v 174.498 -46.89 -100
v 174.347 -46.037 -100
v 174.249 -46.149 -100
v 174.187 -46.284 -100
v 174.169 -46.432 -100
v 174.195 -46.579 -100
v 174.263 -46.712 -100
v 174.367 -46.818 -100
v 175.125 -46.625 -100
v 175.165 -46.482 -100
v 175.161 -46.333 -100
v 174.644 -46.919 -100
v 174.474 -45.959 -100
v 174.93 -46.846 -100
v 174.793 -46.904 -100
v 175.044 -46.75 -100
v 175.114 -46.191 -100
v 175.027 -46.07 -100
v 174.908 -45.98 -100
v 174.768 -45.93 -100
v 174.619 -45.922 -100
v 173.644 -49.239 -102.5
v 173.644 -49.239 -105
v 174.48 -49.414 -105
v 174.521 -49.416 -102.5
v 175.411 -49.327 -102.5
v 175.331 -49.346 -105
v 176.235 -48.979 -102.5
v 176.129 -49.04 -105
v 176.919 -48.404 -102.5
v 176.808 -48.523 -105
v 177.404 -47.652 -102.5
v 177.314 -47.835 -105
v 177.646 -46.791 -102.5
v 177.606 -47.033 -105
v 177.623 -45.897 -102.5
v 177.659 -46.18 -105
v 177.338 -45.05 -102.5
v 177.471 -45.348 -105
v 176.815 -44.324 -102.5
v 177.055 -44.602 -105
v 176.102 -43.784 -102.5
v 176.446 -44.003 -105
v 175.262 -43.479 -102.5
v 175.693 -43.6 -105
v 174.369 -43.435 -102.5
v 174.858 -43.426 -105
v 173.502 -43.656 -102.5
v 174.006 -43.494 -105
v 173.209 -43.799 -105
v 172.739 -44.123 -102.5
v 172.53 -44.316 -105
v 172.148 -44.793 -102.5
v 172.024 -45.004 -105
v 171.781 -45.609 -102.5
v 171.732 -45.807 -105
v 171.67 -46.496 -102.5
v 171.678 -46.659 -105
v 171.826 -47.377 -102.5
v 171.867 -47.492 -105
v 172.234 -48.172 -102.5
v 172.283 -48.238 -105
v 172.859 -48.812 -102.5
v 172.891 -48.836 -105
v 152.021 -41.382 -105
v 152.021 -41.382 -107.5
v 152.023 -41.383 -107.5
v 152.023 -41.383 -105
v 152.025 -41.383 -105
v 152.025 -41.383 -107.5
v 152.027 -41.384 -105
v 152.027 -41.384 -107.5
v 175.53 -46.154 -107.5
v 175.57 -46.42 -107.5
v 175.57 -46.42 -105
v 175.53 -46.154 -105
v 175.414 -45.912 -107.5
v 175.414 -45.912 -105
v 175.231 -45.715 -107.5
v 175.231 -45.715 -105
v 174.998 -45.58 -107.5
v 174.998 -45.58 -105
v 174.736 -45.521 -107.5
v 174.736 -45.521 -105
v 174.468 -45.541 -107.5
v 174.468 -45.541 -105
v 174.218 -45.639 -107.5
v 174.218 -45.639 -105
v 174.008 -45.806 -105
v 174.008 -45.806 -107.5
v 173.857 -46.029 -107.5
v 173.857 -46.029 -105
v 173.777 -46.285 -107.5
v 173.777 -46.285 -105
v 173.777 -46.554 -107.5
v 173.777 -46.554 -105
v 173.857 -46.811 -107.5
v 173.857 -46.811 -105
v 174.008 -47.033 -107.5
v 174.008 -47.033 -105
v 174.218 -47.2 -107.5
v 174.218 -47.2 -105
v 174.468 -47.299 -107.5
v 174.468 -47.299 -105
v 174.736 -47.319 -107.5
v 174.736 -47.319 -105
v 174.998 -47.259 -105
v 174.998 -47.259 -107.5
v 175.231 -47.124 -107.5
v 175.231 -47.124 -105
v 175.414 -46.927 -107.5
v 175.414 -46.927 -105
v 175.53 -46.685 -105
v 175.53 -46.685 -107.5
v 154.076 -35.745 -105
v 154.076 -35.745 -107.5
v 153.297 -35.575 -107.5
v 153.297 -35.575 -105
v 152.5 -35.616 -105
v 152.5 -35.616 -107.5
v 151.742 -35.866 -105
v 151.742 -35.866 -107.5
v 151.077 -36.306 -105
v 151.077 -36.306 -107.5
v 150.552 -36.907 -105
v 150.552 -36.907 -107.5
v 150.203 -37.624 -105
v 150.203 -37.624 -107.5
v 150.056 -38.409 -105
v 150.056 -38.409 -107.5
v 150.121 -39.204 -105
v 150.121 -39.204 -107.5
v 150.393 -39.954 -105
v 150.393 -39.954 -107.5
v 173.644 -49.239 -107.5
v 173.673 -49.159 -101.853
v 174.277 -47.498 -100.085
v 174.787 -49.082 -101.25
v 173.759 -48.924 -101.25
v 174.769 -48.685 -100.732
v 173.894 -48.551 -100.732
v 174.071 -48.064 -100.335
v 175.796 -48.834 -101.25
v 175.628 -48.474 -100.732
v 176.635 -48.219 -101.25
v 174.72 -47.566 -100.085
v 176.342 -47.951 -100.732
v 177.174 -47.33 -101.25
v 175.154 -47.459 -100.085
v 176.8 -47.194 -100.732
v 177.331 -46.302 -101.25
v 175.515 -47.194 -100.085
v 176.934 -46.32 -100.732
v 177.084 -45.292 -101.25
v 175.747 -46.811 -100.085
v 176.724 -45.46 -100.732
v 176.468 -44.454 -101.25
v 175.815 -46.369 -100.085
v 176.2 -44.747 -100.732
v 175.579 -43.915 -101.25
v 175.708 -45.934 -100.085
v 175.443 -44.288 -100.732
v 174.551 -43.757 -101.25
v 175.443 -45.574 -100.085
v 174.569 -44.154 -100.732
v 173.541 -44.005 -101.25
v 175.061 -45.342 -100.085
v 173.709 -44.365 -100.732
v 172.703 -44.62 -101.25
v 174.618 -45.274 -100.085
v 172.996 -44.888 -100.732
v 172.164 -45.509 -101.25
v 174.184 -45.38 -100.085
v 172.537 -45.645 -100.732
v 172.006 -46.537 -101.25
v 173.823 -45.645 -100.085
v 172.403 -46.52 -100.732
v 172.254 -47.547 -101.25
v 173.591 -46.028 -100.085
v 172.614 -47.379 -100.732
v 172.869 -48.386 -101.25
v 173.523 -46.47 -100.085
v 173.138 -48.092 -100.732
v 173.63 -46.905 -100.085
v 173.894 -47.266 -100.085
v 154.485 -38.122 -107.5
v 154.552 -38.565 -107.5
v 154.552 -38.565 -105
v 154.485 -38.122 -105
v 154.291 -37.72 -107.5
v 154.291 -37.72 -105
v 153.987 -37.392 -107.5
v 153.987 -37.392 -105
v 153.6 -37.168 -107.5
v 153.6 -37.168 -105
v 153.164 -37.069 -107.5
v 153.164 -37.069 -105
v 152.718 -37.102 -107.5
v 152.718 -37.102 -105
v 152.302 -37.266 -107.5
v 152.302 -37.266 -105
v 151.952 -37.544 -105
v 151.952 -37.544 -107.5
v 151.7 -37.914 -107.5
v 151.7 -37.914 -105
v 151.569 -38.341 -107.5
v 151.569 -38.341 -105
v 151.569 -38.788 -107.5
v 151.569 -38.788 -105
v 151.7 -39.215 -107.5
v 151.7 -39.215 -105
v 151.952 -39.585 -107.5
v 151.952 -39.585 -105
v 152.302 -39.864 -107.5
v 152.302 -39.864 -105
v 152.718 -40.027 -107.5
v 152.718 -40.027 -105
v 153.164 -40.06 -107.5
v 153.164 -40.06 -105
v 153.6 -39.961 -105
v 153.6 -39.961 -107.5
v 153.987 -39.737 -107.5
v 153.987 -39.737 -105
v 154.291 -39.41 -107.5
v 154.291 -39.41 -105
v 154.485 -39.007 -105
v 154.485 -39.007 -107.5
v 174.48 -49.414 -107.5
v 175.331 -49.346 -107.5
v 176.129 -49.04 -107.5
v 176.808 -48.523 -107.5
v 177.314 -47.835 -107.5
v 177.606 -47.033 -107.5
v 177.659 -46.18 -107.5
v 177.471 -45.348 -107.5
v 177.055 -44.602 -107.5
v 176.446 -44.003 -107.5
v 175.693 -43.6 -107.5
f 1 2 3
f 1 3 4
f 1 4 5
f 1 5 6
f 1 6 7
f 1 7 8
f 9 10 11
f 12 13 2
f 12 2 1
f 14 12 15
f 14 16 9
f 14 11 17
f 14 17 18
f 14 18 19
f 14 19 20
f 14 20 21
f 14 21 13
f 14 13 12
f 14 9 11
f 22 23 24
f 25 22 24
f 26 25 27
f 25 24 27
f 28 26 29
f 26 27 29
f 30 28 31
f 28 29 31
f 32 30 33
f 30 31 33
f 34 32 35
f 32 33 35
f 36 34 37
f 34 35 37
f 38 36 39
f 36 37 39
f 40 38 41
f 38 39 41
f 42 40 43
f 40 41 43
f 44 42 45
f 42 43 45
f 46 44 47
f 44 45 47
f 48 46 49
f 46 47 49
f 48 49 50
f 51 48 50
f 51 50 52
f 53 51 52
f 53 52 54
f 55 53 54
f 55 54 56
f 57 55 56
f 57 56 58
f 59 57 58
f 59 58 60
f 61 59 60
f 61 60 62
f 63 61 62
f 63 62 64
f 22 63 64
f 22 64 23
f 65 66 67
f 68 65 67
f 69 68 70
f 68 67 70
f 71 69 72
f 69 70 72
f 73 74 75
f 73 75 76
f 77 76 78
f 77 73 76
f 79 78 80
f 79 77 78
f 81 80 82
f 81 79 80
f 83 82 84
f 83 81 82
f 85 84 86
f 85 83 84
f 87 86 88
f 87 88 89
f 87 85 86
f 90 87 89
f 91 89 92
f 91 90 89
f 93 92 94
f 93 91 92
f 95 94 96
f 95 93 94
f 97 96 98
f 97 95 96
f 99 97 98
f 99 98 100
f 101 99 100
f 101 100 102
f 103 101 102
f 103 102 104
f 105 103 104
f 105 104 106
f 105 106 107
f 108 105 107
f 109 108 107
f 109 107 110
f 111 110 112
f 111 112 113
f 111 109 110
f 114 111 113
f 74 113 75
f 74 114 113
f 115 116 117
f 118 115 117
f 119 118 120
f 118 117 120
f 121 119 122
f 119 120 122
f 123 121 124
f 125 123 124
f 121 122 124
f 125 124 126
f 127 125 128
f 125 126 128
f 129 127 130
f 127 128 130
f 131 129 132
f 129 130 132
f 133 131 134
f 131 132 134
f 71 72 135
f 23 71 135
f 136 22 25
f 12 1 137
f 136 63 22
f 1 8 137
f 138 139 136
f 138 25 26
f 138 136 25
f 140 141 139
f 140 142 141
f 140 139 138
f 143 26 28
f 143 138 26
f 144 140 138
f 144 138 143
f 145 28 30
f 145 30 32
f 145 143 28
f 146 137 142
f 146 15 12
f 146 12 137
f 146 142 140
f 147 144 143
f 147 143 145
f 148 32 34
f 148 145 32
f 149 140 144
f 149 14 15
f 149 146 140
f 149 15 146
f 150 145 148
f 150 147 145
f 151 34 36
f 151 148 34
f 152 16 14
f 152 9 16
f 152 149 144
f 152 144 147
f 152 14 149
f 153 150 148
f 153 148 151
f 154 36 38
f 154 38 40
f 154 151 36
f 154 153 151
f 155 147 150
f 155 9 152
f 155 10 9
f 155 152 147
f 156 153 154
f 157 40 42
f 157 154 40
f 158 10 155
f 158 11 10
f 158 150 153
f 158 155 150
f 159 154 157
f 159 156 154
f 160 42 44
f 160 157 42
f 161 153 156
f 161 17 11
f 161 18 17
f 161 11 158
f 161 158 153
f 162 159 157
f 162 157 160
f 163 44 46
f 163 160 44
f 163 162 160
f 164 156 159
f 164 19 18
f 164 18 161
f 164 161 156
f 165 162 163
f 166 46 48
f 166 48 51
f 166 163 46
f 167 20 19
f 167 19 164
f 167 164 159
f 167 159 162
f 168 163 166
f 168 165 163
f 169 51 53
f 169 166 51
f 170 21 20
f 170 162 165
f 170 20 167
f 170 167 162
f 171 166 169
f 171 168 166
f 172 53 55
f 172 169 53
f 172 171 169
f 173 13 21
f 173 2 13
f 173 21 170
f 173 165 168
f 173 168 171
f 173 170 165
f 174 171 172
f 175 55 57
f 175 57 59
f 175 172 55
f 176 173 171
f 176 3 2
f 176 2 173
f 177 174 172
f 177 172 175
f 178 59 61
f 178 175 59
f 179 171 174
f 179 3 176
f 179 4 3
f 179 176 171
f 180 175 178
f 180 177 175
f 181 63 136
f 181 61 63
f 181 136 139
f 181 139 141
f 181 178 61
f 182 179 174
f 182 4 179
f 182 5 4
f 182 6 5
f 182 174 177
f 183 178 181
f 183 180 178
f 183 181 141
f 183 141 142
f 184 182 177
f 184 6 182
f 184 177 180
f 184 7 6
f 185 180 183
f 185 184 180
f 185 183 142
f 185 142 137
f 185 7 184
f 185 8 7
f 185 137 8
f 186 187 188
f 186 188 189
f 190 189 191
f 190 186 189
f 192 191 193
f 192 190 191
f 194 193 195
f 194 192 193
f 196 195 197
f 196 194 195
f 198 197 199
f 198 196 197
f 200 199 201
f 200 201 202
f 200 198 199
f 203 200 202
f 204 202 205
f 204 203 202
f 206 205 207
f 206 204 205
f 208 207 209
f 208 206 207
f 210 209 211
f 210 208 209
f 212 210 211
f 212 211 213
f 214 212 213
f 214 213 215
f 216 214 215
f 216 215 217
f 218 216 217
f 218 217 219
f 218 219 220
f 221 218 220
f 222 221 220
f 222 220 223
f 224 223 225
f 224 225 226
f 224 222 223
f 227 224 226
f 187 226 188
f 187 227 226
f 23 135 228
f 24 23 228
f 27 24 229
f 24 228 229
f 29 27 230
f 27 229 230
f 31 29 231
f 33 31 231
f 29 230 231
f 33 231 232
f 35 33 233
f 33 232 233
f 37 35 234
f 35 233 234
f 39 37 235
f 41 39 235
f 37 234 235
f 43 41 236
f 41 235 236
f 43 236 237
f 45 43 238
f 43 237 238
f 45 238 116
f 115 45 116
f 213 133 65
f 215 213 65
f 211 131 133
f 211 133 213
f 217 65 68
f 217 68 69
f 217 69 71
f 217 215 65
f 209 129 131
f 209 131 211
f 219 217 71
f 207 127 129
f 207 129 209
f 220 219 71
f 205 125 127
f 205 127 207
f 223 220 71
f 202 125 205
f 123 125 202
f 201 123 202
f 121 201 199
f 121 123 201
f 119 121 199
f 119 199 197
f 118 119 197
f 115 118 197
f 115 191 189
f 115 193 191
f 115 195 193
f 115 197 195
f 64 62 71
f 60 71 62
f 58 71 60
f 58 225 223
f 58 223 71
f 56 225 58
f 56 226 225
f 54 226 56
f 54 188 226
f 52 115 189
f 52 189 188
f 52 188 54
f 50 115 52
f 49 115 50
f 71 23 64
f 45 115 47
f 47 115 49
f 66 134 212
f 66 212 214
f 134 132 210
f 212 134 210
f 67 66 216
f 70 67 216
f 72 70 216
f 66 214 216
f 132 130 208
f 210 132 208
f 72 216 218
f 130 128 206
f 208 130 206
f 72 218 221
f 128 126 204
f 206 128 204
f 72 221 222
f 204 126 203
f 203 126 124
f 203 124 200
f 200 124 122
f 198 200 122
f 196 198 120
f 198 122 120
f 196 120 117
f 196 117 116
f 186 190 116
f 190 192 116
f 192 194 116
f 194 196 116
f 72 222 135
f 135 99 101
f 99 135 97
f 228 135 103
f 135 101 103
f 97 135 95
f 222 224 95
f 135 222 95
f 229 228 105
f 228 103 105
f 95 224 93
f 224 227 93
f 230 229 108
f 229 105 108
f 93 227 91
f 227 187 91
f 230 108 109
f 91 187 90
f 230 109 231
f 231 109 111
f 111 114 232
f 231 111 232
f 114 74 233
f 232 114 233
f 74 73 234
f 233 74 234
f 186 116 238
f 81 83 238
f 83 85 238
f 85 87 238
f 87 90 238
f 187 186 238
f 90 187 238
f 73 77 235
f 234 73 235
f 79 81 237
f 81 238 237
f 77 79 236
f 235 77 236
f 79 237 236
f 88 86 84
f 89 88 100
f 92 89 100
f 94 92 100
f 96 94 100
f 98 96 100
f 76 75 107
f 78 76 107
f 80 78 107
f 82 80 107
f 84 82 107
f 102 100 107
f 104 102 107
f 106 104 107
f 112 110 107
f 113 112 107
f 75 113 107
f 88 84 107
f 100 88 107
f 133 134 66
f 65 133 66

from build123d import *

# Parameters (mm, degrees)
CROQUIS1_R              = 1.5
CROQUIS1_R_2            = 0.901496021
SALIENTE_EXTRUIR1_DEPTH = 2.5
CROQUIS2_R              = 3
SALIENTE_EXTRUIR2_DEPTH = 5
REDONDEO1_R             = 2.5


with BuildPart() as part:
    # Croquis1 → Saliente-Extruir1 (new body)
    with BuildSketch(Plane.XY.offset(-107.5)):
        with BuildLine():
            Line((163.042186646, -39.002916794), (154.076371743, -35.744978316))
            ThreePointArc((154.076371743, -35.744978316), (150.794254841, -36.588868647), (150.392873293, -39.953885006))
            Line((150.392873293, -39.953885006), (152.021065929, -41.381969984))
            ThreePointArc((152.021065929, -41.381969984), (152.024143971, -41.383094175), (152.02722324, -41.384215004))
            Line((152.02722324, -41.384215004), (173.644297207, -49.239284265))
            ThreePointArc((173.644297207, -49.239284265), (177.488489802, -47.444240173), (175.69344571, -43.600047578))
            Line((175.69344571, -43.600047578), (163.042186646, -39.002916794))
        make_face()
        with Locations((153.051797491, -38.56459666)):
            Circle(CROQUIS1_R, mode=Mode.SUBTRACT)
        with Locations((174.668871458, -46.419665921)):
            Circle(CROQUIS1_R_2, mode=Mode.SUBTRACT)
    extrude(amount=SALIENTE_EXTRUIR1_DEPTH)

    # Croquis2 → Saliente-Extruir2 (add)
    with BuildSketch(Plane.XY.offset(-105)):
        with Locations((174.668871458, -46.419665921)):
            Circle(CROQUIS2_R)
    extrude(amount=SALIENTE_EXTRUIR2_DEPTH)

    # Redondeo1
    redondeo1_edges = [part.edges().sort_by_distance(p)[0] for p in [
        (171.668871458, -46.419665921, -100),
    ]]
    fillet(redondeo1_edges, radius=REDONDEO1_R)


solid = part.part
